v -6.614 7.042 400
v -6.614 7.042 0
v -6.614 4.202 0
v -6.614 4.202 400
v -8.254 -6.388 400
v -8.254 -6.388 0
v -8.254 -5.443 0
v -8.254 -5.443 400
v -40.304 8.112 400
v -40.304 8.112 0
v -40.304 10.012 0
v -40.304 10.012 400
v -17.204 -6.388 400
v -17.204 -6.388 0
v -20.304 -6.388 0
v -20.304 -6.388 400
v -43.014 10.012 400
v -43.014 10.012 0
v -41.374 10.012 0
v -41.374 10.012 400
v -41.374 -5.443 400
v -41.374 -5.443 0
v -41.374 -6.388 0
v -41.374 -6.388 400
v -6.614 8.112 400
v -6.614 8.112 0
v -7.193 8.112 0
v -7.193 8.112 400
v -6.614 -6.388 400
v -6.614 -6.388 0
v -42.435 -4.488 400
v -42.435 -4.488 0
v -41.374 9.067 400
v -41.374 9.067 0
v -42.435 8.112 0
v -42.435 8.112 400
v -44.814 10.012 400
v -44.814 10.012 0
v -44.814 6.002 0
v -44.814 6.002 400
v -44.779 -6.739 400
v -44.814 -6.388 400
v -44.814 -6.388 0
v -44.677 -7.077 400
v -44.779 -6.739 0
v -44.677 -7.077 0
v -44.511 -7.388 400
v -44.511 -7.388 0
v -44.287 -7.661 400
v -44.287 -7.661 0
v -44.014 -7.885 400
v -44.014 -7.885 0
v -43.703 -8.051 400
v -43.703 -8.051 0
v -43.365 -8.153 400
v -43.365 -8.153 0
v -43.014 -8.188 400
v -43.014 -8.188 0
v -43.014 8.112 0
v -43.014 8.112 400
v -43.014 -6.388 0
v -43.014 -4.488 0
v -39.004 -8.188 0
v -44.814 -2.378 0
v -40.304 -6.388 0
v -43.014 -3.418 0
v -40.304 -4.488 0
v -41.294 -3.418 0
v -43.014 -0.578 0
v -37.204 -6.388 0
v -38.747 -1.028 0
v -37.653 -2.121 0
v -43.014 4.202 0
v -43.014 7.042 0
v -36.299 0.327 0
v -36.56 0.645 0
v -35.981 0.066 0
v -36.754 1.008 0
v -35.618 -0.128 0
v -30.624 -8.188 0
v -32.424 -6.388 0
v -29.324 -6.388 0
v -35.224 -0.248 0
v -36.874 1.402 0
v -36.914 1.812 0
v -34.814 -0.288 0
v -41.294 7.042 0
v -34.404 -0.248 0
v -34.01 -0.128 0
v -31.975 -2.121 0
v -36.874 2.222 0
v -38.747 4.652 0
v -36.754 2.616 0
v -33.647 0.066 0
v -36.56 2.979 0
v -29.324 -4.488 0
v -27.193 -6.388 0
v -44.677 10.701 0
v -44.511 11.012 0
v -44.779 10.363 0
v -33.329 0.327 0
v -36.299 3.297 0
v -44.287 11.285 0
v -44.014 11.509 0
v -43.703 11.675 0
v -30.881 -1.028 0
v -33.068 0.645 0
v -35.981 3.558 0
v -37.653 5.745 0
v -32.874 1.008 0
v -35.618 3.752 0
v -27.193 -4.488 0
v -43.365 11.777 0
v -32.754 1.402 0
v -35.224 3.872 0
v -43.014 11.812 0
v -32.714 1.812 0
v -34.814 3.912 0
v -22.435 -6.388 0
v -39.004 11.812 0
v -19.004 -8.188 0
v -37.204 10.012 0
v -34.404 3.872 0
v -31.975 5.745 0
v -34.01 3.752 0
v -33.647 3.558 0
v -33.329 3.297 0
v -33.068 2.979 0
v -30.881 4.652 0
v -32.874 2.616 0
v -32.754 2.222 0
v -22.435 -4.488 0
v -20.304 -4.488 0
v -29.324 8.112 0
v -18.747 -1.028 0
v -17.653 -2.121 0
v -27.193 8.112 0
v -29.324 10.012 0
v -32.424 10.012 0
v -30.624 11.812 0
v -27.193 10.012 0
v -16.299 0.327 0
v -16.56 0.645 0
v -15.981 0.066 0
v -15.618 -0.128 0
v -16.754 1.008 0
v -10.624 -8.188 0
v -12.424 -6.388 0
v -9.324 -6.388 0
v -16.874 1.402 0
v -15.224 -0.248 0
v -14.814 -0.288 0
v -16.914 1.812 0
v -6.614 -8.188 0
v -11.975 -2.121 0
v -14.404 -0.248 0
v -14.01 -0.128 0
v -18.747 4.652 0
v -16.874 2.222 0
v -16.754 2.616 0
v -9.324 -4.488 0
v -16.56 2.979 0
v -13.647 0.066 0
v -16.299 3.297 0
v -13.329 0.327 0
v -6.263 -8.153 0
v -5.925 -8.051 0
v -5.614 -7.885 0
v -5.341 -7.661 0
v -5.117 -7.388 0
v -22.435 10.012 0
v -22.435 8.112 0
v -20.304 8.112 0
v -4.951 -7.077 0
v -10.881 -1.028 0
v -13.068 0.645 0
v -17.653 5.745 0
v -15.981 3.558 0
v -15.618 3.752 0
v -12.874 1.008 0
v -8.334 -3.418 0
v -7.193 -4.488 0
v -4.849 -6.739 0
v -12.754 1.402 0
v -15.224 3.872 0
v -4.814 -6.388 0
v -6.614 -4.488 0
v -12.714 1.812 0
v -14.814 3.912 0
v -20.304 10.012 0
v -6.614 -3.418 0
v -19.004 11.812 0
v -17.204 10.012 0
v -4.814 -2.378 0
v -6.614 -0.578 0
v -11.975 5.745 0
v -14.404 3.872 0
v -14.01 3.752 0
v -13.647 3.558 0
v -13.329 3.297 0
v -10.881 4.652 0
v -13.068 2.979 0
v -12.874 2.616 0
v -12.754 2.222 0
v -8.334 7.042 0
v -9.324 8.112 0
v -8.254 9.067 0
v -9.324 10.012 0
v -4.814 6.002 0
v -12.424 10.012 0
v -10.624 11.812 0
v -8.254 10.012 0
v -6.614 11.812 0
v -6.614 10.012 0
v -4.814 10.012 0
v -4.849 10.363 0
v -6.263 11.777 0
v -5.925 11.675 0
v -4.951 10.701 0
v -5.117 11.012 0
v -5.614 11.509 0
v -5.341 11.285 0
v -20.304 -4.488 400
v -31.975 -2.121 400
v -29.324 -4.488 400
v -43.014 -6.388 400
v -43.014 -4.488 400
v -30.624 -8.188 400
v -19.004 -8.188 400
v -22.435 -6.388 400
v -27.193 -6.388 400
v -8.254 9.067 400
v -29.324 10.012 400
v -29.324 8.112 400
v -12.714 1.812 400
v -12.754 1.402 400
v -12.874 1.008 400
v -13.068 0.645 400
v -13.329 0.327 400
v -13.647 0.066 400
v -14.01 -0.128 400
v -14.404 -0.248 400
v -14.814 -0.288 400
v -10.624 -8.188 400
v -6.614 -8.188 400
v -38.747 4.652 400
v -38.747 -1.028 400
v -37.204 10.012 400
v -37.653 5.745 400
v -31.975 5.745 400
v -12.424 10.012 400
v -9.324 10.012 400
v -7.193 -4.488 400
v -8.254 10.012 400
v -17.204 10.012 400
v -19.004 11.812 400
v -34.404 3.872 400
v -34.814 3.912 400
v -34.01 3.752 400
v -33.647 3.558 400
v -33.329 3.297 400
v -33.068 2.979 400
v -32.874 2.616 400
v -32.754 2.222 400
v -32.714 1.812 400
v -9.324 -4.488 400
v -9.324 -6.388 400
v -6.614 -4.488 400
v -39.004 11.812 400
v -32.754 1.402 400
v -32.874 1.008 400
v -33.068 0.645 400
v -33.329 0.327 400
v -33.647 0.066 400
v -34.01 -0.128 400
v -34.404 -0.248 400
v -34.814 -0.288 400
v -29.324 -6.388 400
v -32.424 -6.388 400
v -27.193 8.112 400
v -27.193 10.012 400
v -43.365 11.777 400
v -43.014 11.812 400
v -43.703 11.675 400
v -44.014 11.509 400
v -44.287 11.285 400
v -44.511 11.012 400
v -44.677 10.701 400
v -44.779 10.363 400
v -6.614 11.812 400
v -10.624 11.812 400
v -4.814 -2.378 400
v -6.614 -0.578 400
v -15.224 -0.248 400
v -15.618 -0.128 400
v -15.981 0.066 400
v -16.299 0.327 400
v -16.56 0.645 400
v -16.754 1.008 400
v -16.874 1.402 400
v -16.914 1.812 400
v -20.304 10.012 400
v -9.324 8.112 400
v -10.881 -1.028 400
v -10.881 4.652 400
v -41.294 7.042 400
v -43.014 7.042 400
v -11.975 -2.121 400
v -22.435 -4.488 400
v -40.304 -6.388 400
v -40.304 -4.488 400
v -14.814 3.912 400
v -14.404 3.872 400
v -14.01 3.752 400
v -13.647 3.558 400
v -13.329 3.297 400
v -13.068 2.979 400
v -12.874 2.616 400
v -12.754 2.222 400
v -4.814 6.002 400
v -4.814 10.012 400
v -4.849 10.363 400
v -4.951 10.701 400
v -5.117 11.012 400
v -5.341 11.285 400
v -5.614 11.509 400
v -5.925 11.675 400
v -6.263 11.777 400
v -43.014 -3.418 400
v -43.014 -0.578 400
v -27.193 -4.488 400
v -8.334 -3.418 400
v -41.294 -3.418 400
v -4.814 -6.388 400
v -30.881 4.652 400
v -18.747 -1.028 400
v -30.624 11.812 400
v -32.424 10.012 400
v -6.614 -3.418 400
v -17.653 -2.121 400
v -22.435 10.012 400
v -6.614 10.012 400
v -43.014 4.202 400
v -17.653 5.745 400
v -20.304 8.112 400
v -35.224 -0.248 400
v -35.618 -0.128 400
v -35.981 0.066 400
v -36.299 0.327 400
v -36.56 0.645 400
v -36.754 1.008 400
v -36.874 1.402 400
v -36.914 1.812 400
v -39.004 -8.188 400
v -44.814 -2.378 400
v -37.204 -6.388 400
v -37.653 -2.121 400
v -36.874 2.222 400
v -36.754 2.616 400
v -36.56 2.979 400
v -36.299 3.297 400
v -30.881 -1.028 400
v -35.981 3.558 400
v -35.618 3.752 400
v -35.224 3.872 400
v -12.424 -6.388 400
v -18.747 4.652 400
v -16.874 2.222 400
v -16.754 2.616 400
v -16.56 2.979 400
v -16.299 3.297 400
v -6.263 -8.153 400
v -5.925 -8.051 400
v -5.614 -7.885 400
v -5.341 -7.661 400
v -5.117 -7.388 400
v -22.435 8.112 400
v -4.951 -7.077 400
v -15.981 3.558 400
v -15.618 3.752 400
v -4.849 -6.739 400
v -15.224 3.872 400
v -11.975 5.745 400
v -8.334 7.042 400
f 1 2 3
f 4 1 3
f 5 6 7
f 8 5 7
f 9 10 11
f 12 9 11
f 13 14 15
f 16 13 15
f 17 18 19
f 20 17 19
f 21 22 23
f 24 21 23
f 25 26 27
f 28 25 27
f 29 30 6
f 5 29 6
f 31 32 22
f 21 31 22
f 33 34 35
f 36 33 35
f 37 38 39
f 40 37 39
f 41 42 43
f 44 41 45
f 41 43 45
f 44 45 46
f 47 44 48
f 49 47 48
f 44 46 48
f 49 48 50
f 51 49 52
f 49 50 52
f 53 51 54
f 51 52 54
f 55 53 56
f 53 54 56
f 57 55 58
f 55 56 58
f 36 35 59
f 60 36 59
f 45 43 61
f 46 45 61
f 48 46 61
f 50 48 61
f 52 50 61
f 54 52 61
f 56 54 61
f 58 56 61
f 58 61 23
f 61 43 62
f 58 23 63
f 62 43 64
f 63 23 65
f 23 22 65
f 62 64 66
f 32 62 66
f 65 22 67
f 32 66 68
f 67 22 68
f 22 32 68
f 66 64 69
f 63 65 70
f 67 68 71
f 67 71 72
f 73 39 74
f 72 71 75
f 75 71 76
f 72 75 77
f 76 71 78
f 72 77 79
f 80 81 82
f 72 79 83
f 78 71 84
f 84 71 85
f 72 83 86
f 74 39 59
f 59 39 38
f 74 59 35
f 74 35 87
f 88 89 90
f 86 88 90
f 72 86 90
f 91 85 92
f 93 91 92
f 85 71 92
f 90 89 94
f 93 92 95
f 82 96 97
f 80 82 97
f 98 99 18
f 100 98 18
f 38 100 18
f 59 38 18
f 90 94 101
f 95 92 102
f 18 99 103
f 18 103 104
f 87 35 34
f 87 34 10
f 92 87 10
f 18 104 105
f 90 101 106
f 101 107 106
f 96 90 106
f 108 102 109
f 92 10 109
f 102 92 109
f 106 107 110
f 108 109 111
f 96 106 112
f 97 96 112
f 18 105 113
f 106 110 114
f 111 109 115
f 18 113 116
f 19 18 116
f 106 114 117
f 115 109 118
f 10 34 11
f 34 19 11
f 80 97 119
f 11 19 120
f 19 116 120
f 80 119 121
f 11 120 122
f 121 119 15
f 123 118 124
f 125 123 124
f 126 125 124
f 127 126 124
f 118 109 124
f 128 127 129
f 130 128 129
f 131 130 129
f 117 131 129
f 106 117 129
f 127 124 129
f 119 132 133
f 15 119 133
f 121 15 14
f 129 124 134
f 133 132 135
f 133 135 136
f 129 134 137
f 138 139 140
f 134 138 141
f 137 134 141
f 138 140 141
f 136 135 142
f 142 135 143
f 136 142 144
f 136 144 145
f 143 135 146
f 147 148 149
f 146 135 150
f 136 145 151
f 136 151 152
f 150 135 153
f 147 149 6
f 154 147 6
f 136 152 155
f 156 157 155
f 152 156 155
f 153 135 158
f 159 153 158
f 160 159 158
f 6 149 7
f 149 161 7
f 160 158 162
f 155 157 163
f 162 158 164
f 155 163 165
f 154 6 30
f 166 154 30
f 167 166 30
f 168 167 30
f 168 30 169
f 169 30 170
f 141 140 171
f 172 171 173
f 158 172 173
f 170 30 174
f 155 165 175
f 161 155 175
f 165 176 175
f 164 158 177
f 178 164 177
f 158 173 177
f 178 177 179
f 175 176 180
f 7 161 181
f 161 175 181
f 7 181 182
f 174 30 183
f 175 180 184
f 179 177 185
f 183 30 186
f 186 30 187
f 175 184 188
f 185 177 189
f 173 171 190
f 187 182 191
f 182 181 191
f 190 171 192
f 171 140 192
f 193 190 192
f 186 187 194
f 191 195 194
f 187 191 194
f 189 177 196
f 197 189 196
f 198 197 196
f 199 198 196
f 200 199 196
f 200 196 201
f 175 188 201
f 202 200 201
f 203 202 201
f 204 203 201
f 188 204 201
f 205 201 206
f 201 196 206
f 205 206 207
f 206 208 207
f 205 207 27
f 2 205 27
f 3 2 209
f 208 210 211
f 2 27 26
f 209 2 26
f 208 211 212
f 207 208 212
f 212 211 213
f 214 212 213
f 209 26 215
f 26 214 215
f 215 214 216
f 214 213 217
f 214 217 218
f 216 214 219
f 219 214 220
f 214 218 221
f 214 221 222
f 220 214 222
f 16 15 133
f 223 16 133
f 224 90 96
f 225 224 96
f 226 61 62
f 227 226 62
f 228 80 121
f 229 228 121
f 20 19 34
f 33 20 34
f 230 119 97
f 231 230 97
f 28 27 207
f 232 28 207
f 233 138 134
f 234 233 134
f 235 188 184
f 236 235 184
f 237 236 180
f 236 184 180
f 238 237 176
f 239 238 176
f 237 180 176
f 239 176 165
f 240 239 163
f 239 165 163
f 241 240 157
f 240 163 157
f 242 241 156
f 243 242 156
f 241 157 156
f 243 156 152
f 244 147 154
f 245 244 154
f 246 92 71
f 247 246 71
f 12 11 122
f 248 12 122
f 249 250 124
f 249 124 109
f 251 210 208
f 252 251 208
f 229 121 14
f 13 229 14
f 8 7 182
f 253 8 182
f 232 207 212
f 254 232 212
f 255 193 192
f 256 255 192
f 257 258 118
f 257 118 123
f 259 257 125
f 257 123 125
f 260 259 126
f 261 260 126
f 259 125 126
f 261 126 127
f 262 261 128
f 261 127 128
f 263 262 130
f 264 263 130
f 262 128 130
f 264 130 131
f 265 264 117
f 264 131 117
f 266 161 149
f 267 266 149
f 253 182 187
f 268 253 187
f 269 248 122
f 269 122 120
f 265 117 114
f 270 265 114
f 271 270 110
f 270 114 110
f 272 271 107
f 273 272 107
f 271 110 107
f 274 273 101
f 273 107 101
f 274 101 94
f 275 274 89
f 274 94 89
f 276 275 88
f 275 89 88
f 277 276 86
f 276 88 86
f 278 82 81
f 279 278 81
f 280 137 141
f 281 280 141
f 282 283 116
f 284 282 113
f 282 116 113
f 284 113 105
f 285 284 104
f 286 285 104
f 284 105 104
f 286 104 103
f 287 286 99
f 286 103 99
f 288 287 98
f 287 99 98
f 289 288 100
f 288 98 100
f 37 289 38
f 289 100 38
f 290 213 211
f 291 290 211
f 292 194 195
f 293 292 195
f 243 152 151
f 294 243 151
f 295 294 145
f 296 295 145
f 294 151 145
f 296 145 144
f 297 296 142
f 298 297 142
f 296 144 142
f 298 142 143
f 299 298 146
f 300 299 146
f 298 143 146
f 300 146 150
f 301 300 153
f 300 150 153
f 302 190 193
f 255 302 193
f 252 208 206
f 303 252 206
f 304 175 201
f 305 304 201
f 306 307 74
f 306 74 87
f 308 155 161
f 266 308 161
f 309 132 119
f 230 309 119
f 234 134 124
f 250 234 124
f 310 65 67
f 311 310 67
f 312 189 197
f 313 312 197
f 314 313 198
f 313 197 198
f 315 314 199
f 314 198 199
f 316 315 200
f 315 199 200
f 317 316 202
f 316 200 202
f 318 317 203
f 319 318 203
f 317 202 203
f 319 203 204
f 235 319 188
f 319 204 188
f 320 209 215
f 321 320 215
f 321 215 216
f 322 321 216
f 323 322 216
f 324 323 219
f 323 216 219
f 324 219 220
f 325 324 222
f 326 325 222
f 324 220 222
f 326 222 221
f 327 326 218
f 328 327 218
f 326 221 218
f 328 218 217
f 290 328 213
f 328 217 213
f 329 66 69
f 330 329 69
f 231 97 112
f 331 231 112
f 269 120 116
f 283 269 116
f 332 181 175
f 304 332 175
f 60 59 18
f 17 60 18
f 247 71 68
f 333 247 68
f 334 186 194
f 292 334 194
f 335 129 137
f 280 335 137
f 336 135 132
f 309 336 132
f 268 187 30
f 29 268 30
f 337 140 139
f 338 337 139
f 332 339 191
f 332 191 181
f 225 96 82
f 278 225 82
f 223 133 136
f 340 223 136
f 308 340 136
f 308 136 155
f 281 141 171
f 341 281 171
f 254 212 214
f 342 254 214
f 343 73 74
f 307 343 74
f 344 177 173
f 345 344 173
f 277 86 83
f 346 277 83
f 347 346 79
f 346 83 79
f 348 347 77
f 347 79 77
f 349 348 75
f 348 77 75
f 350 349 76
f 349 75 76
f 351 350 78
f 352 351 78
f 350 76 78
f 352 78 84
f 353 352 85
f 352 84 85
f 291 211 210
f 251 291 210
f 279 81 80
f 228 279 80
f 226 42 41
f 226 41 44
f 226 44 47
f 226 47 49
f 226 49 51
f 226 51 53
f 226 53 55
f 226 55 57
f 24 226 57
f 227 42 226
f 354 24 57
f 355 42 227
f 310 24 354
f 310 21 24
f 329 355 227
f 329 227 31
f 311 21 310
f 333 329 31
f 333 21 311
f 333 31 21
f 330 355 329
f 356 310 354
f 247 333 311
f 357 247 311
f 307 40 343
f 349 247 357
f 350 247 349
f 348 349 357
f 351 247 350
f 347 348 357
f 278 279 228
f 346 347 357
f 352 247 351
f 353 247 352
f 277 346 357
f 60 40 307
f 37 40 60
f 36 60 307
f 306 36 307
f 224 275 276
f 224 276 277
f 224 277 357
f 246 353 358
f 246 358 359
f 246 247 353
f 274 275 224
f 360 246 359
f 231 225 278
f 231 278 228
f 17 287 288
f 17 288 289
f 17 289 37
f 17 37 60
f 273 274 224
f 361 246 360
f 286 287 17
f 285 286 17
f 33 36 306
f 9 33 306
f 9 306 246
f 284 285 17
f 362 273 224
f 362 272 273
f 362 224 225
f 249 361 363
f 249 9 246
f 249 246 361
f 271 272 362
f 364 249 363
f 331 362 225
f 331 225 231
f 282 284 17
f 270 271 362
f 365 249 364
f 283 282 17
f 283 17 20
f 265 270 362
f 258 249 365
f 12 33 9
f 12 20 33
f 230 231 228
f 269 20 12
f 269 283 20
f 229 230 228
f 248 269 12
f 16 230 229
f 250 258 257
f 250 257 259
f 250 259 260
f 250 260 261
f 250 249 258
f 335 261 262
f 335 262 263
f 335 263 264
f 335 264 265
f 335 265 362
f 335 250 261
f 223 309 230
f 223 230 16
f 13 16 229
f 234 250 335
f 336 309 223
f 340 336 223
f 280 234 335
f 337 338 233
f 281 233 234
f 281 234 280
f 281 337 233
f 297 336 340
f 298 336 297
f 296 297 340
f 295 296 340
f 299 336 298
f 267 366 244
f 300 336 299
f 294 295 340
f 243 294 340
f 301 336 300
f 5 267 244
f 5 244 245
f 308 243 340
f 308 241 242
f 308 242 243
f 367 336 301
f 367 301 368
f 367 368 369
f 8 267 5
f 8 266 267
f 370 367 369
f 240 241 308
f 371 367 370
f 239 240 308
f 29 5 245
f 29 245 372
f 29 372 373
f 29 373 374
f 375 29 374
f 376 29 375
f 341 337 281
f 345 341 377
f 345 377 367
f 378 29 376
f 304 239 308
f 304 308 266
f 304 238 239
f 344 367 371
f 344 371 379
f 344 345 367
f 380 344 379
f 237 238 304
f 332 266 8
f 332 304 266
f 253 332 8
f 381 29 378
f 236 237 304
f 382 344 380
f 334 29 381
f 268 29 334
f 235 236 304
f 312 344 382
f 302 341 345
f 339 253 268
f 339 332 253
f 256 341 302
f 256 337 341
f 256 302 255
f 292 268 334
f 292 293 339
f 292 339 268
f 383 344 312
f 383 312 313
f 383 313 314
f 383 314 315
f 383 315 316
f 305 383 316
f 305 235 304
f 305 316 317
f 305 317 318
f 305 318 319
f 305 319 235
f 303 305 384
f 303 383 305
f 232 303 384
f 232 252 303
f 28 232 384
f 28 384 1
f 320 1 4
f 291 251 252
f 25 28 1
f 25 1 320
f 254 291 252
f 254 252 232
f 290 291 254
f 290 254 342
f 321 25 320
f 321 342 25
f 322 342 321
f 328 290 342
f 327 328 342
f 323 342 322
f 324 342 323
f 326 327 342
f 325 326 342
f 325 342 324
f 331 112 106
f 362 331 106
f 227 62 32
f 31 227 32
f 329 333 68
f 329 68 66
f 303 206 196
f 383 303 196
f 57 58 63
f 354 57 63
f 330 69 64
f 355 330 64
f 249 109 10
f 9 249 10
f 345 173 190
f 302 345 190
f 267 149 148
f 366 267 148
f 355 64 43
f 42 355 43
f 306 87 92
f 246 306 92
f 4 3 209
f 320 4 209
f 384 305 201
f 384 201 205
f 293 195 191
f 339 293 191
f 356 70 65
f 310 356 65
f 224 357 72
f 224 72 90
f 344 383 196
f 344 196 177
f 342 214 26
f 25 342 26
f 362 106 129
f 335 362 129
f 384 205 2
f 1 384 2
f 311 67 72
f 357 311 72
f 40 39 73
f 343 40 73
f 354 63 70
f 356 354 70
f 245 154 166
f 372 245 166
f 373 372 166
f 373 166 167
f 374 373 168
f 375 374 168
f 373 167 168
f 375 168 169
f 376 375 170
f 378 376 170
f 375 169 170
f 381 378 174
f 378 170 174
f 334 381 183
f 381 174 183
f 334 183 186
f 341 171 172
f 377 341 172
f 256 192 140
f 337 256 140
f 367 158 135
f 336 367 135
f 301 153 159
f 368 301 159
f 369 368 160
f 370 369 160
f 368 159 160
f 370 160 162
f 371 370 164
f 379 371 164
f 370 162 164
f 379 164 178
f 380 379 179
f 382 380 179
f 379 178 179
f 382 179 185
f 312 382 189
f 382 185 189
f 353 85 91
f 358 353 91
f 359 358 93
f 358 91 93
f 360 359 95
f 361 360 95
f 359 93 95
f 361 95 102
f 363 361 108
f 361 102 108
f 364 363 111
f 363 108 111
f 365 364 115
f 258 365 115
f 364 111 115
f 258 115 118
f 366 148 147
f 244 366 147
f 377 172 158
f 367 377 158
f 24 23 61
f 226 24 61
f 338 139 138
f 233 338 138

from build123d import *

# Parameters (mm, degrees)
F1_DEPTH = 400


with BuildPart() as f1:
    # F0 (on Top) → F1 (new body)
    with BuildSketch(Plane.XY):
        with BuildLine():
            ThreePointArc((-43.014015, 11.811976), (-44.286807, 11.284768), (-44.814015, 10.011976))
            Line((-44.814015, 10.011976), (-44.814015, 6.001976))
            Line((-44.814015, 6.001976), (-43.014015, 4.201976))
            Line((-43.014015, 4.201976), (-43.014015, 7.041976))
            Line((-43.014015, 7.041976), (-41.294215, 7.041976))
            Line((-41.294215, 7.041976), (-38.746832, 4.651976))
            Line((-38.746832, 4.651976), (-38.746832, 1.811976))
            Line((-38.746832, 1.811976), (-38.746832, -1.028024))
            Line((-38.746832, -1.028024), (-41.294215, -3.418024))
            Line((-41.294215, -3.418024), (-43.014015, -3.418024))
            Line((-43.014015, -3.418024), (-43.014015, -0.578024))
            Line((-43.014015, -0.578024), (-44.814015, -2.378024))
            Line((-44.814015, -2.378024), (-44.814015, -6.388024))
            ThreePointArc((-44.814015, -6.388024), (-44.286807, -7.660816), (-43.014015, -8.188024))
            Line((-43.014015, -8.188024), (-39.004015, -8.188024))
            Line((-39.004015, -8.188024), (-37.204015, -6.388024))
            Line((-37.204015, -6.388024), (-40.304332, -6.388024))
            Line((-40.304332, -6.388024), (-40.304332, -4.488024))
            Line((-40.304332, -4.488024), (-37.652902, -2.120841))
            Line((-37.652902, -2.120841), (-34.814015, -2.120841))
            Line((-34.814015, -2.120841), (-31.975129, -2.120841))
            Line((-31.975129, -2.120841), (-29.323698, -4.488024))
            Line((-29.323698, -4.488024), (-29.323698, -6.388024))
            Line((-29.323698, -6.388024), (-32.424015, -6.388024))
            Line((-32.424015, -6.388024), (-30.624015, -8.188024))
            Line((-30.624015, -8.188024), (-26.614015, -8.188024))
            Line((-26.614015, -8.188024), (-23.014015, -8.188024))
            Line((-23.014015, -8.188024), (-19.004015, -8.188024))
            Line((-19.004015, -8.188024), (-17.204015, -6.388024))
            Line((-17.204015, -6.388024), (-20.304332, -6.388024))
            Line((-20.304332, -6.388024), (-20.304332, -4.488024))
            Line((-20.304332, -4.488024), (-17.652902, -2.120841))
            Line((-17.652902, -2.120841), (-14.814015, -2.120841))
            Line((-14.814015, -2.120841), (-11.975129, -2.120841))
            Line((-11.975129, -2.120841), (-9.323698, -4.488024))
            Line((-9.323698, -4.488024), (-9.323698, -6.388024))
            Line((-9.323698, -6.388024), (-12.424015, -6.388024))
            Line((-12.424015, -6.388024), (-10.624015, -8.188024))
            Line((-10.624015, -8.188024), (-6.614015, -8.188024))
            ThreePointArc((-6.614015, -8.188024), (-5.341223, -7.660816), (-4.814015, -6.388024))
            Line((-4.814015, -6.388024), (-4.814015, -2.378024))
            Line((-4.814015, -2.378024), (-6.614015, -0.578024))
            Line((-6.614015, -0.578024), (-6.614015, -3.418024))
            Line((-6.614015, -3.418024), (-8.333815, -3.418024))
            Line((-8.333815, -3.418024), (-10.881198, -1.028024))
            Line((-10.881198, -1.028024), (-10.881198, 1.811976))
            Line((-10.881198, 1.811976), (-10.881198, 4.651976))
            Line((-10.881198, 4.651976), (-8.333815, 7.041976))
            Line((-8.333815, 7.041976), (-6.614015, 7.041976))
            Line((-6.614015, 7.041976), (-6.614015, 4.201976))
            Line((-6.614015, 4.201976), (-4.814015, 6.001976))
            Line((-4.814015, 6.001976), (-4.814015, 10.011976))
            ThreePointArc((-4.814015, 10.011976), (-5.341223, 11.284768), (-6.614015, 11.811976))
            Line((-6.614015, 11.811976), (-10.624015, 11.811976))
            Line((-10.624015, 11.811976), (-12.424015, 10.011976))
            Line((-12.424015, 10.011976), (-9.323698, 10.011976))
            Line((-9.323698, 10.011976), (-9.323698, 8.111976))
            Line((-9.323698, 8.111976), (-11.975129, 5.744793))
            Line((-11.975129, 5.744793), (-14.814015, 5.744793))
            Line((-14.814015, 5.744793), (-17.652902, 5.744793))
            Line((-17.652902, 5.744793), (-20.304332, 8.111976))
            Line((-20.304332, 8.111976), (-20.304332, 10.011976))
            Line((-20.304332, 10.011976), (-17.204015, 10.011976))
            Line((-17.204015, 10.011976), (-19.004015, 11.811976))
            Line((-19.004015, 11.811976), (-23.014015, 11.811976))
            Line((-23.014015, 11.811976), (-26.614015, 11.811976))
            Line((-26.614015, 11.811976), (-30.624015, 11.811976))
            Line((-30.624015, 11.811976), (-32.424015, 10.011976))
            Line((-32.424015, 10.011976), (-29.323698, 10.011976))
            Line((-29.323698, 10.011976), (-29.323698, 8.111976))
            Line((-29.323698, 8.111976), (-31.975129, 5.744793))
            Line((-31.975129, 5.744793), (-34.814015, 5.744793))
            Line((-34.814015, 5.744793), (-37.652902, 5.744793))
            Line((-37.652902, 5.744793), (-40.304332, 8.111976))
            Line((-40.304332, 8.111976), (-40.304332, 10.011976))
            Line((-40.304332, 10.011976), (-37.204015, 10.011976))
            Line((-37.204015, 10.011976), (-39.004015, 11.811976))
            Line((-39.004015, 11.811976), (-43.014015, 11.811976))
        make_face()
        Polygon((-43.014015, -4.488024), (-42.434675, -4.488024), (-41.374332, -5.443314), (-41.374332, -6.388024), (-43.014015, -6.388024), align=None, mode=Mode.SUBTRACT)
        Polygon((-6.614015, -6.388024), (-8.253698, -6.388024), (-8.253698, -5.443314), (-7.193355, -4.488024), (-6.614015, -4.488024), align=None, mode=Mode.SUBTRACT)
        with BuildLine():
            ThreePointArc((-36.914015, 1.811976), (-36.298939, 3.2969), (-34.814015, 3.911976))
            ThreePointArc((-34.814015, 3.911976), (-33.329091, 3.2969), (-32.714015, 1.811976))
            ThreePointArc((-32.714015, 1.811976), (-33.329091, 0.327052), (-34.814015, -0.288024))
            ThreePointArc((-34.814015, -0.288024), (-36.298939, 0.327052), (-36.914015, 1.811976))
        make_face(mode=Mode.SUBTRACT)
        Polygon((-30.881198, 1.811976), (-30.881198, 4.651976), (-27.193355, 8.111976), (-27.193355, 10.011976), (-22.434675, 10.011976), (-22.434675, 8.111976), (-18.746832, 4.651976), (-18.746832, 1.811976), (-18.746832, -1.028024), (-22.434675, -4.488024), (-22.434675, -6.388024), (-27.193355, -6.388024), (-27.193355, -4.488024), (-30.881198, -1.028024), align=None, mode=Mode.SUBTRACT)
        Polygon((-43.014015, 8.111976), (-43.014015, 10.011976), (-41.374332, 10.011976), (-41.374332, 9.067266), (-42.434675, 8.111976), align=None, mode=Mode.SUBTRACT)
        with BuildLine():
            ThreePointArc((-16.914015, 1.811976), (-16.298939, 3.2969), (-14.814015, 3.911976))
            ThreePointArc((-14.814015, 3.911976), (-13.329091, 3.2969), (-12.714015, 1.811976))
            ThreePointArc((-12.714015, 1.811976), (-13.329091, 0.327052), (-14.814015, -0.288024))
            ThreePointArc((-14.814015, -0.288024), (-16.298939, 0.327052), (-16.914015, 1.811976))
        make_face(mode=Mode.SUBTRACT)
        Polygon((-8.253698, 9.067266), (-8.253698, 10.011976), (-6.614015, 10.011976), (-6.614015, 8.111976), (-7.193355, 8.111976), align=None, mode=Mode.SUBTRACT)
    extrude(amount=F1_DEPTH)


solid = f1.part
